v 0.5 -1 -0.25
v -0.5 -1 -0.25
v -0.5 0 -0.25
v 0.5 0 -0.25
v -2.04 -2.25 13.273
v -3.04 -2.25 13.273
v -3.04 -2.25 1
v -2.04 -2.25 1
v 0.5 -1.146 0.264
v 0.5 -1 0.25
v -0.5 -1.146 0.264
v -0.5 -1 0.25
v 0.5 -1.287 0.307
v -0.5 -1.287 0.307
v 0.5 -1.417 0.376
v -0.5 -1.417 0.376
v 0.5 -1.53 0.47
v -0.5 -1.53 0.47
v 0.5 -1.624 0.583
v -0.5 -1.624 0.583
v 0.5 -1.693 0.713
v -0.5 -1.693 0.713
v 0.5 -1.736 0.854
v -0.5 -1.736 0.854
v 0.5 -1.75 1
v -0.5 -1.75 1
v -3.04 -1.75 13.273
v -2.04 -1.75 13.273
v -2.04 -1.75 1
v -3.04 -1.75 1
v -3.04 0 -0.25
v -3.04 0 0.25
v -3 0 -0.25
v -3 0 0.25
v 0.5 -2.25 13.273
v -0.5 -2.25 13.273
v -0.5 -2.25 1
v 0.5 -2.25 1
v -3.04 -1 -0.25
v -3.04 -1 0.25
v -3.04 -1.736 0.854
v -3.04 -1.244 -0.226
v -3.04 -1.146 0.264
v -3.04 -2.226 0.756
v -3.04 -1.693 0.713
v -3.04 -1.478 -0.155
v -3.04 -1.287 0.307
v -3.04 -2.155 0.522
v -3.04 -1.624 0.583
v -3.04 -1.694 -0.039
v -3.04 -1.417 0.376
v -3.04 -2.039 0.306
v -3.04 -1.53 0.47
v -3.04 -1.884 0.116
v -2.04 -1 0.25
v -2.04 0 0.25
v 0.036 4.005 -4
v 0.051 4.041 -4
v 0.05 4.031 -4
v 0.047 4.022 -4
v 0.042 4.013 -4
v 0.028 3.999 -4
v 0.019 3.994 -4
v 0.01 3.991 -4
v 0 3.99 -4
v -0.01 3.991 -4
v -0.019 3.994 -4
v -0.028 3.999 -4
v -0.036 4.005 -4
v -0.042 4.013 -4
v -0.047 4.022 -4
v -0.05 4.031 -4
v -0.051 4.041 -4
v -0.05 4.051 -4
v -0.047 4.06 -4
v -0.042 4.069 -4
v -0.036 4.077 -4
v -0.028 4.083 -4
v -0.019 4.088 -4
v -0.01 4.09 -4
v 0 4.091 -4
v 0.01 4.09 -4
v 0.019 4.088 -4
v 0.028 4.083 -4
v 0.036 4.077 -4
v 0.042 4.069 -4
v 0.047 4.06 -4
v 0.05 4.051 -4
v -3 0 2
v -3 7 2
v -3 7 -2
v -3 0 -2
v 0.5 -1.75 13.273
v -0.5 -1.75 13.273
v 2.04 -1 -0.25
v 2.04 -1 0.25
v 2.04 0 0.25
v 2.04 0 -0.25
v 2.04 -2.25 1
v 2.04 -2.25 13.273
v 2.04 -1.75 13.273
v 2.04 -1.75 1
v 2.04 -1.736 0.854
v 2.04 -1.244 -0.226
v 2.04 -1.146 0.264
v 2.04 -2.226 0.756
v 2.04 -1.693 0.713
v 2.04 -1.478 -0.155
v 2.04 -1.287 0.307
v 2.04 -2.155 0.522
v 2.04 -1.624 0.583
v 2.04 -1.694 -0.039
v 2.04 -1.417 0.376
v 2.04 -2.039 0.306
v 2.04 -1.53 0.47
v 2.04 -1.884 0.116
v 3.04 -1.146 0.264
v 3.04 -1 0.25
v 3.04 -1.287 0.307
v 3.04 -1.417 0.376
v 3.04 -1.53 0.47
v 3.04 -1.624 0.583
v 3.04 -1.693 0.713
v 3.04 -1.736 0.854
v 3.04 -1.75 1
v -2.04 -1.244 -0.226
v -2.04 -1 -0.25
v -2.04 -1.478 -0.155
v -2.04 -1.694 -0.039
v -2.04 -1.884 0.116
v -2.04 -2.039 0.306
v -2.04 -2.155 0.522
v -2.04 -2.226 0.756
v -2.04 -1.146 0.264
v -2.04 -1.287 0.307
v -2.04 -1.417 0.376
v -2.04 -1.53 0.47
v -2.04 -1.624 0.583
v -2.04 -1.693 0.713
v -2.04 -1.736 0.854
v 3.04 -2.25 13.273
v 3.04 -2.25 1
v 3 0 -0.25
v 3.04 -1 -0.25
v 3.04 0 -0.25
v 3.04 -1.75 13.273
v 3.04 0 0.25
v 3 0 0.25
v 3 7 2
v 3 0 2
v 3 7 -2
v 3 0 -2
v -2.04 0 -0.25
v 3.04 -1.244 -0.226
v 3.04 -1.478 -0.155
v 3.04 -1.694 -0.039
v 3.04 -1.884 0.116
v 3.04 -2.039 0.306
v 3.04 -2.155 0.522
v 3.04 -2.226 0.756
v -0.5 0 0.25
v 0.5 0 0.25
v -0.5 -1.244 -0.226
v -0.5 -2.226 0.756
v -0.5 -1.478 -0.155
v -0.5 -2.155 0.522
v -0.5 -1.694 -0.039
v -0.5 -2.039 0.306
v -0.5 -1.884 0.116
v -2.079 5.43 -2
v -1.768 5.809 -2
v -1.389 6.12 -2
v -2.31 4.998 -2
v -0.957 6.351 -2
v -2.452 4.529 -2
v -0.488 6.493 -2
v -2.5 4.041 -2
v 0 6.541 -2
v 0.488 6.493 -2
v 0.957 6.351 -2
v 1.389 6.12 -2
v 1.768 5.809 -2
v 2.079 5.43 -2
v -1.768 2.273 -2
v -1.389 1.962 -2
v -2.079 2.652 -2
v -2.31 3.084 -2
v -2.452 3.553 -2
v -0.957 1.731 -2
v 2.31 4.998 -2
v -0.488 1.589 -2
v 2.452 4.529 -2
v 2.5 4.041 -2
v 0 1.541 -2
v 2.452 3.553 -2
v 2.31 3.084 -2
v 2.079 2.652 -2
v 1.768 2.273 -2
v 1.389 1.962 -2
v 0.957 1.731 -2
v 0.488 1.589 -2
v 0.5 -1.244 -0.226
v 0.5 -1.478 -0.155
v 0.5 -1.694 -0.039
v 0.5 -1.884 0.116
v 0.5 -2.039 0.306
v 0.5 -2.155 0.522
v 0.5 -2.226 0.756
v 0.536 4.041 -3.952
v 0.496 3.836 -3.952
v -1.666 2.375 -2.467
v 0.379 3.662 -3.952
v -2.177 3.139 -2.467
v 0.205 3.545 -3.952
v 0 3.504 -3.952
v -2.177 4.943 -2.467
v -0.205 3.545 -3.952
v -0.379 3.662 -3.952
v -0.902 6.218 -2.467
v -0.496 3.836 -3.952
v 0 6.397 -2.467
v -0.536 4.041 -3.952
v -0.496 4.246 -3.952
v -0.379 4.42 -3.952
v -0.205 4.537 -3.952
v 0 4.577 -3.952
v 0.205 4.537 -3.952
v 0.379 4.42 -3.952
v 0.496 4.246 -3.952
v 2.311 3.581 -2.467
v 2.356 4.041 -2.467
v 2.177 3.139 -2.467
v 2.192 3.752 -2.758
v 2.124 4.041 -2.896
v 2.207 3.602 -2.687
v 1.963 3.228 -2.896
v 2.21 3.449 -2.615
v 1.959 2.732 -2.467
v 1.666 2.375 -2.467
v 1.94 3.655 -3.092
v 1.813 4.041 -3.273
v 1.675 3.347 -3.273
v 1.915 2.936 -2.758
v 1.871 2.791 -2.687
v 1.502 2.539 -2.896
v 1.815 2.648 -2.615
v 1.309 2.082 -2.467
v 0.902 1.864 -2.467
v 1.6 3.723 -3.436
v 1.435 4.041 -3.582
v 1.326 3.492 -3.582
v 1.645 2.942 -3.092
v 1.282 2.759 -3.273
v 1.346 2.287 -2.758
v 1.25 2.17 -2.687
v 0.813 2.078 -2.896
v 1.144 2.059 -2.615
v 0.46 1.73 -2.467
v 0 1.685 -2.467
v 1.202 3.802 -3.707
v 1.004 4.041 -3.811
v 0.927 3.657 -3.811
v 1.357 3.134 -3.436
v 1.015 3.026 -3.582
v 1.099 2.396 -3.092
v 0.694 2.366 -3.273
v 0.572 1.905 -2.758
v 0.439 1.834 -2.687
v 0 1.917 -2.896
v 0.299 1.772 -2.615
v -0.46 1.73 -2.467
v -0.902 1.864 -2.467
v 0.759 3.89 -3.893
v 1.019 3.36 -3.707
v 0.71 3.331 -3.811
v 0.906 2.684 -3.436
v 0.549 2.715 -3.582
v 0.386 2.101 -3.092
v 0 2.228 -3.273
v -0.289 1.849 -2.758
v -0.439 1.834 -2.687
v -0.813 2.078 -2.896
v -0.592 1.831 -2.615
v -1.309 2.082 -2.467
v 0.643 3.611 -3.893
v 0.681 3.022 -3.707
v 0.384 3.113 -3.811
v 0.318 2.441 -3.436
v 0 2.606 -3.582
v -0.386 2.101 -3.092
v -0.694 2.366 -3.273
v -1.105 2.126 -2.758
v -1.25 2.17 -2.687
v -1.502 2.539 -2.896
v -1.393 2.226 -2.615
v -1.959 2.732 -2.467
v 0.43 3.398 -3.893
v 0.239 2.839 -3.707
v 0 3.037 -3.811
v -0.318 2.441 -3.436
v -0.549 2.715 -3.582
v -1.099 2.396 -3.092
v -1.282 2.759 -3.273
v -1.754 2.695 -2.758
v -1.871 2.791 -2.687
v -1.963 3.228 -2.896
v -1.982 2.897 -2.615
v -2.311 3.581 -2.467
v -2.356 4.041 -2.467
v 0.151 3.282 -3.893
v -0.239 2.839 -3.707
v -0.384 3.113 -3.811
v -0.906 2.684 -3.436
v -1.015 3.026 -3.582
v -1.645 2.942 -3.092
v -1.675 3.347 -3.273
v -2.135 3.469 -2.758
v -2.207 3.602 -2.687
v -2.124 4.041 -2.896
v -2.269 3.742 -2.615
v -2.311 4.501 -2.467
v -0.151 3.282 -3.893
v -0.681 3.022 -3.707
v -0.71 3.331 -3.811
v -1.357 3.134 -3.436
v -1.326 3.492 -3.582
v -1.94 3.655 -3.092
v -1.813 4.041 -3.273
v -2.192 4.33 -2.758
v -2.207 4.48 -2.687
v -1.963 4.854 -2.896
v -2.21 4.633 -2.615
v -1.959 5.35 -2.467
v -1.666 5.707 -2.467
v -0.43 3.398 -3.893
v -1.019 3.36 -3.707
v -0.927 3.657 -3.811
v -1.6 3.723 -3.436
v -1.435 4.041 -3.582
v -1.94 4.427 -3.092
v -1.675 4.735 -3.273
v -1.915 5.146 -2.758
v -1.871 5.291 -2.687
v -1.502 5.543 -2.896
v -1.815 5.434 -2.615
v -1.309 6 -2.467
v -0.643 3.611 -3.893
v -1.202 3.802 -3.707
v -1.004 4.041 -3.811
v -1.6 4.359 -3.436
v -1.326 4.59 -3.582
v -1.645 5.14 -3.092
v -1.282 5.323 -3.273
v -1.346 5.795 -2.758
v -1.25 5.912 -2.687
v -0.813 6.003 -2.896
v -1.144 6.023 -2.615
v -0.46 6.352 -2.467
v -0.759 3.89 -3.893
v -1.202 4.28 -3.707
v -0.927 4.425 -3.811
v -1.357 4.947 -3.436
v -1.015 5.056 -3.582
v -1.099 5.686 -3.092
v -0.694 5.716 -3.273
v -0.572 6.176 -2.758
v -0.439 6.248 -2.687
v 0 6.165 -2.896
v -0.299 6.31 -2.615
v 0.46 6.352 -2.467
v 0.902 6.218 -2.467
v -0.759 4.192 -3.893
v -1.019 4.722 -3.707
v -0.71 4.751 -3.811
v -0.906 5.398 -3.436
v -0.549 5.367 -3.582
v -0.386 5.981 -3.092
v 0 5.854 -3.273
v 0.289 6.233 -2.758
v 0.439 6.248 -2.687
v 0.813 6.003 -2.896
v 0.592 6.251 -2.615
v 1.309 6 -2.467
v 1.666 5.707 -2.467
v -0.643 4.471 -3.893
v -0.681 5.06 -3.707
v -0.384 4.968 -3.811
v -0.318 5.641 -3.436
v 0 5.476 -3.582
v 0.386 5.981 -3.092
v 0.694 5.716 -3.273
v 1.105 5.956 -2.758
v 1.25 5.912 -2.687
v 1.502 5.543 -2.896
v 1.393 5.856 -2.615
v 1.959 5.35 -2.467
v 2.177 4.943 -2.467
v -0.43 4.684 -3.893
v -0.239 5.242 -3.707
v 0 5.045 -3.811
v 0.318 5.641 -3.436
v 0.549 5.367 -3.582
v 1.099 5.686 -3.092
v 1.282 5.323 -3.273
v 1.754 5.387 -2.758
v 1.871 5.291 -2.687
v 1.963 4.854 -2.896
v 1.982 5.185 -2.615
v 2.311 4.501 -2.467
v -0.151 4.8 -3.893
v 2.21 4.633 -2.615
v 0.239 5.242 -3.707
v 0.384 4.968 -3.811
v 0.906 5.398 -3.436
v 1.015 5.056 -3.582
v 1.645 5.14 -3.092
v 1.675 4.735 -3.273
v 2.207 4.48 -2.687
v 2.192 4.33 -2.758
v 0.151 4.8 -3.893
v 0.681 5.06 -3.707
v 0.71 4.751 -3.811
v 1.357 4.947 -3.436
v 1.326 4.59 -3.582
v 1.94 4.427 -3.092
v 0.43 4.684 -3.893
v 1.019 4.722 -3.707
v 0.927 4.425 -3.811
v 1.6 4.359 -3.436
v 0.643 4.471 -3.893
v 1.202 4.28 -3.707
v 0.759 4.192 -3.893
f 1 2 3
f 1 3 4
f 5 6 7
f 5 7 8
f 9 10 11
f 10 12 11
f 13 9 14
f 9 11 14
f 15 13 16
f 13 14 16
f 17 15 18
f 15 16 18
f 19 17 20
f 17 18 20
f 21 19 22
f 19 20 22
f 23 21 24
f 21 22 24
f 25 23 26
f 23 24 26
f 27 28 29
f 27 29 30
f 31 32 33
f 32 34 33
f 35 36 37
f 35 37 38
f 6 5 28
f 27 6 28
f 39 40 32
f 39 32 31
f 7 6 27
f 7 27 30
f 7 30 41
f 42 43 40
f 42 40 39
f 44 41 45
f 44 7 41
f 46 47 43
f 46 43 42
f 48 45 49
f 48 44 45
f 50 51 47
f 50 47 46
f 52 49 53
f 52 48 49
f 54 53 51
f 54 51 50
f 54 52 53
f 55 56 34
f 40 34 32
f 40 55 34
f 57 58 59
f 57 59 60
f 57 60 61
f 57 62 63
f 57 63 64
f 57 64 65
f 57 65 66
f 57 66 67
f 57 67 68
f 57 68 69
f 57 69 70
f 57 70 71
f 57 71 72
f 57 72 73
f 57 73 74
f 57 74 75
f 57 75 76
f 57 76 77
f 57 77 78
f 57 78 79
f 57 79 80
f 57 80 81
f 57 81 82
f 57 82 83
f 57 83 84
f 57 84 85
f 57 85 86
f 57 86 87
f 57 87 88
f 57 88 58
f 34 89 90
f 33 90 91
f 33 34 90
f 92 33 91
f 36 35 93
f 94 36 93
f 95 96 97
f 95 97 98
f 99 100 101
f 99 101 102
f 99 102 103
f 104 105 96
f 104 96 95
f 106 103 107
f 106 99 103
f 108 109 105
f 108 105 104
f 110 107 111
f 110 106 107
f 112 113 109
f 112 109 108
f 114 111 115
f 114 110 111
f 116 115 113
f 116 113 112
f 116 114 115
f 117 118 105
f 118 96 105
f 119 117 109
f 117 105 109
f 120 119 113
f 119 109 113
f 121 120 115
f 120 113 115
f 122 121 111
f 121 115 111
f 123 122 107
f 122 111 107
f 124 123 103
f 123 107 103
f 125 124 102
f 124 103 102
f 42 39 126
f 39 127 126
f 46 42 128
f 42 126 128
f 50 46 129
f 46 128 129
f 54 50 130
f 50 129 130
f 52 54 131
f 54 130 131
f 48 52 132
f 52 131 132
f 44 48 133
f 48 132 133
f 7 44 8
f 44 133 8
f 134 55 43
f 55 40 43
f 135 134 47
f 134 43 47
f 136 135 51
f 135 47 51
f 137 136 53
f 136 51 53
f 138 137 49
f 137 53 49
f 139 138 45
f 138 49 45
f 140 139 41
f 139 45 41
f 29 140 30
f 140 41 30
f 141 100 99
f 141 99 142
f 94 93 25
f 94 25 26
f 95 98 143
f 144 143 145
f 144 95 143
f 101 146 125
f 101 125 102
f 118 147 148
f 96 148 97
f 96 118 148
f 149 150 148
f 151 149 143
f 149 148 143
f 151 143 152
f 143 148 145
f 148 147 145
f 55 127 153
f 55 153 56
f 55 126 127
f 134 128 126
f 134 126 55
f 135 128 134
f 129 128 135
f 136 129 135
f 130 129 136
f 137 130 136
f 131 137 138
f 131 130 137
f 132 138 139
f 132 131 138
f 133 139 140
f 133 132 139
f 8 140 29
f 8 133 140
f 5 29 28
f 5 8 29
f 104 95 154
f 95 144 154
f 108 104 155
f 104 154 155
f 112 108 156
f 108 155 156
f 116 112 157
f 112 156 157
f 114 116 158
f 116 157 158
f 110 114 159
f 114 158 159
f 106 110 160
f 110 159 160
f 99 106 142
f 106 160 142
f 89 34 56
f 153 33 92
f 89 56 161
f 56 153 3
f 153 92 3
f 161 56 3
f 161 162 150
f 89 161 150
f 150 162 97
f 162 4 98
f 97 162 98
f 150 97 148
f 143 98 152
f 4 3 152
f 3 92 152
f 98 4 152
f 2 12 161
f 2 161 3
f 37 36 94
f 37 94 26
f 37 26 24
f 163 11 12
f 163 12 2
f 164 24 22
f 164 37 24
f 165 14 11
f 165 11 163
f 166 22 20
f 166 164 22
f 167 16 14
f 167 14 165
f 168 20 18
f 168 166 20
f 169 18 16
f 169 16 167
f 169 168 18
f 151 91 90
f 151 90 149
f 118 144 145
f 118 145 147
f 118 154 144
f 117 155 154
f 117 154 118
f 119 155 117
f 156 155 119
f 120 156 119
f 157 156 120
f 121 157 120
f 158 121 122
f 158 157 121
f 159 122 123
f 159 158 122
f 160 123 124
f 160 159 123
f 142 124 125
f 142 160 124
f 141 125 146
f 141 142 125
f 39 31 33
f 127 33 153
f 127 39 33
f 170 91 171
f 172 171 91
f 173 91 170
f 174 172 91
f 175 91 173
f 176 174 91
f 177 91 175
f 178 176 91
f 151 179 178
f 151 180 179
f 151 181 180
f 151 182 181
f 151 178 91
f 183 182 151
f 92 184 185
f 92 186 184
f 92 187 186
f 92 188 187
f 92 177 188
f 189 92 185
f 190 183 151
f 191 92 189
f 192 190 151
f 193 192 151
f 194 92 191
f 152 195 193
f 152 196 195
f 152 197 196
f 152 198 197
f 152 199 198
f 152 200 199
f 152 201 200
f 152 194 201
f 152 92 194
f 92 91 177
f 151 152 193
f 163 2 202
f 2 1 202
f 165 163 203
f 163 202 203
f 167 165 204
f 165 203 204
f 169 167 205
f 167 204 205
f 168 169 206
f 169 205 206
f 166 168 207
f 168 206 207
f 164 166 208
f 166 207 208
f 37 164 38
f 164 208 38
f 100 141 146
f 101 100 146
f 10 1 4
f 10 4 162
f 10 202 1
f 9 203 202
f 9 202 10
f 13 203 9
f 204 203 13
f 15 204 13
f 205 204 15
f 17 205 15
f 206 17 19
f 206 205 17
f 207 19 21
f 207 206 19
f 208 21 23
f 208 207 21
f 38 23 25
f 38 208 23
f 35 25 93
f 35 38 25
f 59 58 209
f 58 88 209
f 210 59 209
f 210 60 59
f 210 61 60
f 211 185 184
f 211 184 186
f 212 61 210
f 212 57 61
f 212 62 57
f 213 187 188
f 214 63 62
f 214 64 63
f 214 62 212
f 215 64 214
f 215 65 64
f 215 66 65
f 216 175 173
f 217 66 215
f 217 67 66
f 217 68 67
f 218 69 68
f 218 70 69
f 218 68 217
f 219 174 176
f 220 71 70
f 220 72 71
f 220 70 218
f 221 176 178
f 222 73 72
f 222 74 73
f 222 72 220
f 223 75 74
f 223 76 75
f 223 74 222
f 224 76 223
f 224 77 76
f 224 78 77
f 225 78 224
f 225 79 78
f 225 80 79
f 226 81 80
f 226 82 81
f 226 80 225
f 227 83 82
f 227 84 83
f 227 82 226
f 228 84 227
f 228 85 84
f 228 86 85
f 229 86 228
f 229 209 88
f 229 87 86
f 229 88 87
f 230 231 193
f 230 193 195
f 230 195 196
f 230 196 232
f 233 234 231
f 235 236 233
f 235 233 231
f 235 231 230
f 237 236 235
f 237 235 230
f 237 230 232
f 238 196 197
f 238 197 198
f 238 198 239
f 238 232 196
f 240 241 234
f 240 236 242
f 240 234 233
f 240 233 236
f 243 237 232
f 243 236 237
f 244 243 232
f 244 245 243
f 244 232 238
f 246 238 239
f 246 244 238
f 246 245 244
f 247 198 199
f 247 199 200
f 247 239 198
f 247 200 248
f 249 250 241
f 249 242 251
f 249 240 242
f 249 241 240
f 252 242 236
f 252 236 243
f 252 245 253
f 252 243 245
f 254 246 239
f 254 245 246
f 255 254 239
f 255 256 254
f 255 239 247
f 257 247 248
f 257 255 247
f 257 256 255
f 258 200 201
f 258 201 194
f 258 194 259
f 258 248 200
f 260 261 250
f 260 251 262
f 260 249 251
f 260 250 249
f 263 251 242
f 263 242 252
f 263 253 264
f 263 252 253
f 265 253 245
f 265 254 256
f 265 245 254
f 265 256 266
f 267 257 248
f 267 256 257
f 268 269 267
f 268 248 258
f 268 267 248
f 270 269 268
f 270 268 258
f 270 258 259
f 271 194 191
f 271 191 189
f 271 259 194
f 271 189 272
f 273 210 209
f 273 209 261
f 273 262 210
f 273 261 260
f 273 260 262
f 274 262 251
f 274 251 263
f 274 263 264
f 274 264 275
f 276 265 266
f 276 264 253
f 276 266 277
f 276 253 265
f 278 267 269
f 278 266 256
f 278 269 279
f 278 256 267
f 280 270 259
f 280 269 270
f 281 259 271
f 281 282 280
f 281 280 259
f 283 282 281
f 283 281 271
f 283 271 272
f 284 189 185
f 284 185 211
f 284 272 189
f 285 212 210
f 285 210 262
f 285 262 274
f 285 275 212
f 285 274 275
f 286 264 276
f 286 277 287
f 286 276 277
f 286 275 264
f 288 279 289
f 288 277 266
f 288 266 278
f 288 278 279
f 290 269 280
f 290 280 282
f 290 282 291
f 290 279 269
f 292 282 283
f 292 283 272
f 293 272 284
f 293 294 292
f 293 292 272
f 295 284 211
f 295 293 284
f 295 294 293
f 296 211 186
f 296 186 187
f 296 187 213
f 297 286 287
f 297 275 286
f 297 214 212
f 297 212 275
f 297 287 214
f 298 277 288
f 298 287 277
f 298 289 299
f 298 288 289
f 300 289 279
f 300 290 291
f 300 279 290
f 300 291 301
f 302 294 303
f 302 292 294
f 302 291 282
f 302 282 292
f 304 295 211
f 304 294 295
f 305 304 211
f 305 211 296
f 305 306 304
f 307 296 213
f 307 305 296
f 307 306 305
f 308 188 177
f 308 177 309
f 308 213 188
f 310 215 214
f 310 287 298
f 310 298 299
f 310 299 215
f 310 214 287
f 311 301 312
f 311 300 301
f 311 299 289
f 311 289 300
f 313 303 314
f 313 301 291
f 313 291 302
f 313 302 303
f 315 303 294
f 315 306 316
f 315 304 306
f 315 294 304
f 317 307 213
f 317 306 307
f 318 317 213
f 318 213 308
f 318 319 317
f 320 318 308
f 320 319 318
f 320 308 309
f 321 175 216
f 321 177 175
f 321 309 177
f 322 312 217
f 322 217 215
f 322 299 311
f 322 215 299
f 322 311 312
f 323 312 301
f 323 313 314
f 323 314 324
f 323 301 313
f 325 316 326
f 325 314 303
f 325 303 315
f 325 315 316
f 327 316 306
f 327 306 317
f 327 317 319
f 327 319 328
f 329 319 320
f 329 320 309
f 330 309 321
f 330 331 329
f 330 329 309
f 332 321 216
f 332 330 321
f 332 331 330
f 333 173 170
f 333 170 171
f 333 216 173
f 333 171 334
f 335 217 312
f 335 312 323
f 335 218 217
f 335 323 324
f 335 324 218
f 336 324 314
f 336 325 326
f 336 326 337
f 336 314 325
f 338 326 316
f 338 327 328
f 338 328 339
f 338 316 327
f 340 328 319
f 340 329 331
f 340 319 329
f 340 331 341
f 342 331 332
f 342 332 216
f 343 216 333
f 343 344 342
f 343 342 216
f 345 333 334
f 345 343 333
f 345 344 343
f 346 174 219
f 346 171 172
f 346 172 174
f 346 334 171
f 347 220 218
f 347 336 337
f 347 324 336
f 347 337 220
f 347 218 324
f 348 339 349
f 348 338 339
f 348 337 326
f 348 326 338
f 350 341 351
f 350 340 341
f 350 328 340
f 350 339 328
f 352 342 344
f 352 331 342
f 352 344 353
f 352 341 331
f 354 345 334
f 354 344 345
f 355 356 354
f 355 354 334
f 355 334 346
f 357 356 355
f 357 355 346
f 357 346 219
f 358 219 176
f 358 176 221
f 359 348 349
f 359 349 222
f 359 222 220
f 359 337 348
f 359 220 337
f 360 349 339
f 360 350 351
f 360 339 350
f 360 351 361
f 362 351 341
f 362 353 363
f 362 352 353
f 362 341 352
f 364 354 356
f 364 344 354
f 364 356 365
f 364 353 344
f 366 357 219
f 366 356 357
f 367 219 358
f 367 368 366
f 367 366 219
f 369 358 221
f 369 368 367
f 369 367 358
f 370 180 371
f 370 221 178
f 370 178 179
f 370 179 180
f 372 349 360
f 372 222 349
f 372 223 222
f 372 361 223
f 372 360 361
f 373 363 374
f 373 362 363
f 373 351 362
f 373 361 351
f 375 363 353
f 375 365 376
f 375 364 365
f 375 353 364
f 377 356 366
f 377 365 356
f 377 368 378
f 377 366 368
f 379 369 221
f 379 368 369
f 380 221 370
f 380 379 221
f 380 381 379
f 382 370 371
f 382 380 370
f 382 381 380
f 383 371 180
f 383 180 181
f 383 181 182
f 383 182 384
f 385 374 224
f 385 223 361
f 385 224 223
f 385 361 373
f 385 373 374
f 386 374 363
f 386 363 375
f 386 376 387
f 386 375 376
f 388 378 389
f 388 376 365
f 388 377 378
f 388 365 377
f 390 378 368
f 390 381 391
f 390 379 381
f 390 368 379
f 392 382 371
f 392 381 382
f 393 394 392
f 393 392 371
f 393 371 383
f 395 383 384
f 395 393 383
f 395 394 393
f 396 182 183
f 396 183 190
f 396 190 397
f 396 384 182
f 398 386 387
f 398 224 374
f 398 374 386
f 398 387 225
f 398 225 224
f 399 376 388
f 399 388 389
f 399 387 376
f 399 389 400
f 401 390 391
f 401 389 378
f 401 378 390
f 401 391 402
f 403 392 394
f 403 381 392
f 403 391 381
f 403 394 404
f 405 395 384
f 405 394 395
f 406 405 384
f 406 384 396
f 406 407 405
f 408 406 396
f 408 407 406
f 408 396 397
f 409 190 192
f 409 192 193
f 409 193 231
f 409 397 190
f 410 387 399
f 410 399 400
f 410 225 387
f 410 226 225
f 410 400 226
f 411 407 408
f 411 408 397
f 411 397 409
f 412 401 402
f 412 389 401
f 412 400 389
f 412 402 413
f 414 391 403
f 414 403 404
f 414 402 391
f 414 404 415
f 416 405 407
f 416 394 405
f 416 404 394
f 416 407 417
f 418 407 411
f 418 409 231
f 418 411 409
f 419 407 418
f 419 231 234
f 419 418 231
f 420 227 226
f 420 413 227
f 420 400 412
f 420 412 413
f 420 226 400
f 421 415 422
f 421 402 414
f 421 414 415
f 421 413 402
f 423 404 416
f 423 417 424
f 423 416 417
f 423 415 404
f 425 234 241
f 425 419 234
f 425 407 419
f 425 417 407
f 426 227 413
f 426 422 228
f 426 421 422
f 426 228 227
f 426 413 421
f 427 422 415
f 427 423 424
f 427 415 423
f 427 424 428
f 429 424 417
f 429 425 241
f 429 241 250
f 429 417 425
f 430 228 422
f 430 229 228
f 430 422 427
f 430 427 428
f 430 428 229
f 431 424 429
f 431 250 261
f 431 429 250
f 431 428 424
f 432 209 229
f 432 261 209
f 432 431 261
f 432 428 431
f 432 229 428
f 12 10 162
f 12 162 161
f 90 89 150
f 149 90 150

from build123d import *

# Parameters (mm, degrees)
SKETCH_1_W      = 6
SKETCH_1_H      = 4
EXTRUDE_1_DEPTH = 7
SKETCH_2_R      = 2.5
EXTRUDE_2_DEPTH = 2
FILLET_1_R      = 2.5
SKETCH_3_W      = 1
SKETCH_3_H      = 0.5


with BuildPart() as part:
    # 草图1 → 拉伸1 (new body)
    with BuildSketch(Plane(origin=(0, 0, 0), x_dir=(1, 0, 0), z_dir=(0, 1, 0))):
        Rectangle(SKETCH_1_W, SKETCH_1_H)
    extrude(amount=EXTRUDE_1_DEPTH)

    # 草图2 → 拉伸2 (add)
    with BuildSketch(Plane(origin=(0, 0, -2), x_dir=(-1, 0, 0), z_dir=(0, 0, -1))):
        with Locations(Location((0, 4.040945029, 0), (0, 0, 180))):
            Circle(SKETCH_2_R)
    extrude(amount=EXTRUDE_2_DEPTH)

    # 圆角1
    # the kernel refuses this fillet: 2.5 mm, written as the material it takes off along each edge
    with BuildSketch(Plane(origin=(0, 4.040945029, -4), x_dir=(1, 0, 0), z_dir=(0, 1, 0))) as fillet_1_piece_1:
        with BuildLine():
            CenterArc((0.050510257, -2.5), FILLET_1_R, 11.536959033, 78.463040967)
            Line((0.050510257, 0), (0.050510257, 0.05))
            Line((0.050510257, 0.05), (2.5, 0.05))
            Line((2.5, 0.05), (2.55, 0))
            ThreePointArc((2.55, 0), (2.55, -1), (2.548989795, -1.99))
            Line((2.548989795, -1.99), (2.5, -2))
        make_face()
    revolve(axis=Axis((0, 4.040945029, -4), (0, 0, -1)), mode=Mode.SUBTRACT)

    # 扫描1: sweep along a path in 草图4
    with BuildLine(Plane(origin=(0, 0, 0), x_dir=(0, 0, -1), z_dir=(1, 0, 0))) as sweep_1_path:
        Line((0, 0), (0, -1))
        ThreePointArc((0, -1), (-0.292893219, -1.707106781), (-1, -2))
        Line((-1, -2), (-13.273282855, -2))
    # 草图3 → 扫描1 (sweep)
    with BuildSketch(Plane.XZ):
        Rectangle(SKETCH_3_W, SKETCH_3_H)
        with Locations((2.54, 0)):
            Rectangle(SKETCH_3_W, SKETCH_3_H)
        with Locations((-2.54, 0)):
            Rectangle(SKETCH_3_W, SKETCH_3_H)
    sweep(path=sweep_1_path.line)


solid = part.part
